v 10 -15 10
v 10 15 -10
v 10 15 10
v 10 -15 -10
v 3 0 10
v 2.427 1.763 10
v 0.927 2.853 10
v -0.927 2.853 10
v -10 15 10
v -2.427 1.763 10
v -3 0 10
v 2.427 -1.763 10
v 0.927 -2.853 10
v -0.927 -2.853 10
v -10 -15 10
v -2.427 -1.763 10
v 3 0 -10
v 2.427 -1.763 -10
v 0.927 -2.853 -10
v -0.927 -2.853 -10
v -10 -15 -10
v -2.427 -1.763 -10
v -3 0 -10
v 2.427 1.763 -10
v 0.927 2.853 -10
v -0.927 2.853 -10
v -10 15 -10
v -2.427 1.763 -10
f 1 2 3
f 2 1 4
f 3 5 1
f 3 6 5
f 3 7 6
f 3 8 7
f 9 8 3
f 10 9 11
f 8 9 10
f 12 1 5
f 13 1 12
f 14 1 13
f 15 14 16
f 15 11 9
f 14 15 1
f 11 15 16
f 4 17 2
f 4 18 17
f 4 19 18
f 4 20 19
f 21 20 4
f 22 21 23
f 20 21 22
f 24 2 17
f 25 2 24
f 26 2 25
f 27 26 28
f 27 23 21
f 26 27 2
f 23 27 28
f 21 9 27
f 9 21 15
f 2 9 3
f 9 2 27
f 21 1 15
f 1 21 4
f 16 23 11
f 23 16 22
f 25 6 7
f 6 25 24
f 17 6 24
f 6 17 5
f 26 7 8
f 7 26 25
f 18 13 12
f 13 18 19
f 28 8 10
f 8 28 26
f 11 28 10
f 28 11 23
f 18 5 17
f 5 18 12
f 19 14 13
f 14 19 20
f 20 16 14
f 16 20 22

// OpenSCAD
// Universal quadpod by OK1CDJ
// midle part of arm
cube_width=20;
cube_lenght=30;
cube_height=20;
screw_dia=6;
difference(){
    cube([cube_width,cube_lenght,cube_height], center=true); 
    cylinder(h = 20 , d = screw_dia, center=true); 
    
}
